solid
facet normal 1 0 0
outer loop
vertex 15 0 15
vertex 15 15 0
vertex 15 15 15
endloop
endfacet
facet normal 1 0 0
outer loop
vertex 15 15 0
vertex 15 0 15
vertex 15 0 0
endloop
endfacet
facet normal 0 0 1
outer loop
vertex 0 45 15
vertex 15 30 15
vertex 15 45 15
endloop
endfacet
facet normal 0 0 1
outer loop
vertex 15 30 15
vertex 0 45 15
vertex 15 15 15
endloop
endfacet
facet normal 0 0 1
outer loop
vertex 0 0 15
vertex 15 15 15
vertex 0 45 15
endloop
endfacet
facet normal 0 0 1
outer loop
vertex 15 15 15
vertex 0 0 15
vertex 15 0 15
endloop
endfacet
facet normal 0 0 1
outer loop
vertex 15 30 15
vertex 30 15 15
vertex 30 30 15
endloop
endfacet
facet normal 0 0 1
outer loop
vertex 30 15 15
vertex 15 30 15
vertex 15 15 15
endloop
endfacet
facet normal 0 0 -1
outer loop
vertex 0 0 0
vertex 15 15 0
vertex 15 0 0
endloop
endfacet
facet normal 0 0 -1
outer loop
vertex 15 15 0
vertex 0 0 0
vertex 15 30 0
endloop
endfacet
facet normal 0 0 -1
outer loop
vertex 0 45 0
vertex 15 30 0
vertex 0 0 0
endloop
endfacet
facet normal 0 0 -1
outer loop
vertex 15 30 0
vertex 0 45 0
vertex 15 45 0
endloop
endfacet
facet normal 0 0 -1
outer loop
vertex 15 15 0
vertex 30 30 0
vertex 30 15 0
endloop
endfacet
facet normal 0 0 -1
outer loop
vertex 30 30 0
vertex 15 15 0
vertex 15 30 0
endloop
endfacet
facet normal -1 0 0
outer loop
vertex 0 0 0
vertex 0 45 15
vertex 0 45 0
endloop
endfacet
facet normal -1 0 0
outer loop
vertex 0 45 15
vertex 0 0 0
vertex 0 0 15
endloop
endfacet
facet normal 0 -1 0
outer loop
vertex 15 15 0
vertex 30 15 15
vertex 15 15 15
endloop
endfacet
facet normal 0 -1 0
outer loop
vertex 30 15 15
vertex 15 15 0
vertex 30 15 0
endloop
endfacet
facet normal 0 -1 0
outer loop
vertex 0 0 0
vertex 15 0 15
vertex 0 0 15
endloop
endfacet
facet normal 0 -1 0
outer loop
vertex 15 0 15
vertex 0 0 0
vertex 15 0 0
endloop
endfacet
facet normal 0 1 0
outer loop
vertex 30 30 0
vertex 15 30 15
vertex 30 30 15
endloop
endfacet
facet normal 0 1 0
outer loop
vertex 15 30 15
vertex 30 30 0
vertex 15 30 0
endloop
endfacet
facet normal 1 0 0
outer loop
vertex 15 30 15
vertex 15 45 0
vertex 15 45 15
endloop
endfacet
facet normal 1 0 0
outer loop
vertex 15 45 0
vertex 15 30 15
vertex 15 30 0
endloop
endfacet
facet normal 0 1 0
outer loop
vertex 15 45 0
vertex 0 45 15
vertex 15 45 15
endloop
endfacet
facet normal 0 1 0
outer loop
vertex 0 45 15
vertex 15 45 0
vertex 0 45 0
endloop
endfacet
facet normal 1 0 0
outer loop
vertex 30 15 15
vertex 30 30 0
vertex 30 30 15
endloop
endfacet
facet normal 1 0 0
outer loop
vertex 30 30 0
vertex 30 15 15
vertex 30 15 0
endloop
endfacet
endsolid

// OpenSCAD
// Fongo piece 15: T. GPL-3.0; see README.txt.
// All cube positions derive from the canonical catalogue. z points up.
unit = 15; // mm, scale all pieces AND cards together
positions = [[0,0,0],[0,1,0],[0,2,0],[1,1,0]];
union() { for (p = positions) translate(p * unit) cube([unit, unit, unit]); }
